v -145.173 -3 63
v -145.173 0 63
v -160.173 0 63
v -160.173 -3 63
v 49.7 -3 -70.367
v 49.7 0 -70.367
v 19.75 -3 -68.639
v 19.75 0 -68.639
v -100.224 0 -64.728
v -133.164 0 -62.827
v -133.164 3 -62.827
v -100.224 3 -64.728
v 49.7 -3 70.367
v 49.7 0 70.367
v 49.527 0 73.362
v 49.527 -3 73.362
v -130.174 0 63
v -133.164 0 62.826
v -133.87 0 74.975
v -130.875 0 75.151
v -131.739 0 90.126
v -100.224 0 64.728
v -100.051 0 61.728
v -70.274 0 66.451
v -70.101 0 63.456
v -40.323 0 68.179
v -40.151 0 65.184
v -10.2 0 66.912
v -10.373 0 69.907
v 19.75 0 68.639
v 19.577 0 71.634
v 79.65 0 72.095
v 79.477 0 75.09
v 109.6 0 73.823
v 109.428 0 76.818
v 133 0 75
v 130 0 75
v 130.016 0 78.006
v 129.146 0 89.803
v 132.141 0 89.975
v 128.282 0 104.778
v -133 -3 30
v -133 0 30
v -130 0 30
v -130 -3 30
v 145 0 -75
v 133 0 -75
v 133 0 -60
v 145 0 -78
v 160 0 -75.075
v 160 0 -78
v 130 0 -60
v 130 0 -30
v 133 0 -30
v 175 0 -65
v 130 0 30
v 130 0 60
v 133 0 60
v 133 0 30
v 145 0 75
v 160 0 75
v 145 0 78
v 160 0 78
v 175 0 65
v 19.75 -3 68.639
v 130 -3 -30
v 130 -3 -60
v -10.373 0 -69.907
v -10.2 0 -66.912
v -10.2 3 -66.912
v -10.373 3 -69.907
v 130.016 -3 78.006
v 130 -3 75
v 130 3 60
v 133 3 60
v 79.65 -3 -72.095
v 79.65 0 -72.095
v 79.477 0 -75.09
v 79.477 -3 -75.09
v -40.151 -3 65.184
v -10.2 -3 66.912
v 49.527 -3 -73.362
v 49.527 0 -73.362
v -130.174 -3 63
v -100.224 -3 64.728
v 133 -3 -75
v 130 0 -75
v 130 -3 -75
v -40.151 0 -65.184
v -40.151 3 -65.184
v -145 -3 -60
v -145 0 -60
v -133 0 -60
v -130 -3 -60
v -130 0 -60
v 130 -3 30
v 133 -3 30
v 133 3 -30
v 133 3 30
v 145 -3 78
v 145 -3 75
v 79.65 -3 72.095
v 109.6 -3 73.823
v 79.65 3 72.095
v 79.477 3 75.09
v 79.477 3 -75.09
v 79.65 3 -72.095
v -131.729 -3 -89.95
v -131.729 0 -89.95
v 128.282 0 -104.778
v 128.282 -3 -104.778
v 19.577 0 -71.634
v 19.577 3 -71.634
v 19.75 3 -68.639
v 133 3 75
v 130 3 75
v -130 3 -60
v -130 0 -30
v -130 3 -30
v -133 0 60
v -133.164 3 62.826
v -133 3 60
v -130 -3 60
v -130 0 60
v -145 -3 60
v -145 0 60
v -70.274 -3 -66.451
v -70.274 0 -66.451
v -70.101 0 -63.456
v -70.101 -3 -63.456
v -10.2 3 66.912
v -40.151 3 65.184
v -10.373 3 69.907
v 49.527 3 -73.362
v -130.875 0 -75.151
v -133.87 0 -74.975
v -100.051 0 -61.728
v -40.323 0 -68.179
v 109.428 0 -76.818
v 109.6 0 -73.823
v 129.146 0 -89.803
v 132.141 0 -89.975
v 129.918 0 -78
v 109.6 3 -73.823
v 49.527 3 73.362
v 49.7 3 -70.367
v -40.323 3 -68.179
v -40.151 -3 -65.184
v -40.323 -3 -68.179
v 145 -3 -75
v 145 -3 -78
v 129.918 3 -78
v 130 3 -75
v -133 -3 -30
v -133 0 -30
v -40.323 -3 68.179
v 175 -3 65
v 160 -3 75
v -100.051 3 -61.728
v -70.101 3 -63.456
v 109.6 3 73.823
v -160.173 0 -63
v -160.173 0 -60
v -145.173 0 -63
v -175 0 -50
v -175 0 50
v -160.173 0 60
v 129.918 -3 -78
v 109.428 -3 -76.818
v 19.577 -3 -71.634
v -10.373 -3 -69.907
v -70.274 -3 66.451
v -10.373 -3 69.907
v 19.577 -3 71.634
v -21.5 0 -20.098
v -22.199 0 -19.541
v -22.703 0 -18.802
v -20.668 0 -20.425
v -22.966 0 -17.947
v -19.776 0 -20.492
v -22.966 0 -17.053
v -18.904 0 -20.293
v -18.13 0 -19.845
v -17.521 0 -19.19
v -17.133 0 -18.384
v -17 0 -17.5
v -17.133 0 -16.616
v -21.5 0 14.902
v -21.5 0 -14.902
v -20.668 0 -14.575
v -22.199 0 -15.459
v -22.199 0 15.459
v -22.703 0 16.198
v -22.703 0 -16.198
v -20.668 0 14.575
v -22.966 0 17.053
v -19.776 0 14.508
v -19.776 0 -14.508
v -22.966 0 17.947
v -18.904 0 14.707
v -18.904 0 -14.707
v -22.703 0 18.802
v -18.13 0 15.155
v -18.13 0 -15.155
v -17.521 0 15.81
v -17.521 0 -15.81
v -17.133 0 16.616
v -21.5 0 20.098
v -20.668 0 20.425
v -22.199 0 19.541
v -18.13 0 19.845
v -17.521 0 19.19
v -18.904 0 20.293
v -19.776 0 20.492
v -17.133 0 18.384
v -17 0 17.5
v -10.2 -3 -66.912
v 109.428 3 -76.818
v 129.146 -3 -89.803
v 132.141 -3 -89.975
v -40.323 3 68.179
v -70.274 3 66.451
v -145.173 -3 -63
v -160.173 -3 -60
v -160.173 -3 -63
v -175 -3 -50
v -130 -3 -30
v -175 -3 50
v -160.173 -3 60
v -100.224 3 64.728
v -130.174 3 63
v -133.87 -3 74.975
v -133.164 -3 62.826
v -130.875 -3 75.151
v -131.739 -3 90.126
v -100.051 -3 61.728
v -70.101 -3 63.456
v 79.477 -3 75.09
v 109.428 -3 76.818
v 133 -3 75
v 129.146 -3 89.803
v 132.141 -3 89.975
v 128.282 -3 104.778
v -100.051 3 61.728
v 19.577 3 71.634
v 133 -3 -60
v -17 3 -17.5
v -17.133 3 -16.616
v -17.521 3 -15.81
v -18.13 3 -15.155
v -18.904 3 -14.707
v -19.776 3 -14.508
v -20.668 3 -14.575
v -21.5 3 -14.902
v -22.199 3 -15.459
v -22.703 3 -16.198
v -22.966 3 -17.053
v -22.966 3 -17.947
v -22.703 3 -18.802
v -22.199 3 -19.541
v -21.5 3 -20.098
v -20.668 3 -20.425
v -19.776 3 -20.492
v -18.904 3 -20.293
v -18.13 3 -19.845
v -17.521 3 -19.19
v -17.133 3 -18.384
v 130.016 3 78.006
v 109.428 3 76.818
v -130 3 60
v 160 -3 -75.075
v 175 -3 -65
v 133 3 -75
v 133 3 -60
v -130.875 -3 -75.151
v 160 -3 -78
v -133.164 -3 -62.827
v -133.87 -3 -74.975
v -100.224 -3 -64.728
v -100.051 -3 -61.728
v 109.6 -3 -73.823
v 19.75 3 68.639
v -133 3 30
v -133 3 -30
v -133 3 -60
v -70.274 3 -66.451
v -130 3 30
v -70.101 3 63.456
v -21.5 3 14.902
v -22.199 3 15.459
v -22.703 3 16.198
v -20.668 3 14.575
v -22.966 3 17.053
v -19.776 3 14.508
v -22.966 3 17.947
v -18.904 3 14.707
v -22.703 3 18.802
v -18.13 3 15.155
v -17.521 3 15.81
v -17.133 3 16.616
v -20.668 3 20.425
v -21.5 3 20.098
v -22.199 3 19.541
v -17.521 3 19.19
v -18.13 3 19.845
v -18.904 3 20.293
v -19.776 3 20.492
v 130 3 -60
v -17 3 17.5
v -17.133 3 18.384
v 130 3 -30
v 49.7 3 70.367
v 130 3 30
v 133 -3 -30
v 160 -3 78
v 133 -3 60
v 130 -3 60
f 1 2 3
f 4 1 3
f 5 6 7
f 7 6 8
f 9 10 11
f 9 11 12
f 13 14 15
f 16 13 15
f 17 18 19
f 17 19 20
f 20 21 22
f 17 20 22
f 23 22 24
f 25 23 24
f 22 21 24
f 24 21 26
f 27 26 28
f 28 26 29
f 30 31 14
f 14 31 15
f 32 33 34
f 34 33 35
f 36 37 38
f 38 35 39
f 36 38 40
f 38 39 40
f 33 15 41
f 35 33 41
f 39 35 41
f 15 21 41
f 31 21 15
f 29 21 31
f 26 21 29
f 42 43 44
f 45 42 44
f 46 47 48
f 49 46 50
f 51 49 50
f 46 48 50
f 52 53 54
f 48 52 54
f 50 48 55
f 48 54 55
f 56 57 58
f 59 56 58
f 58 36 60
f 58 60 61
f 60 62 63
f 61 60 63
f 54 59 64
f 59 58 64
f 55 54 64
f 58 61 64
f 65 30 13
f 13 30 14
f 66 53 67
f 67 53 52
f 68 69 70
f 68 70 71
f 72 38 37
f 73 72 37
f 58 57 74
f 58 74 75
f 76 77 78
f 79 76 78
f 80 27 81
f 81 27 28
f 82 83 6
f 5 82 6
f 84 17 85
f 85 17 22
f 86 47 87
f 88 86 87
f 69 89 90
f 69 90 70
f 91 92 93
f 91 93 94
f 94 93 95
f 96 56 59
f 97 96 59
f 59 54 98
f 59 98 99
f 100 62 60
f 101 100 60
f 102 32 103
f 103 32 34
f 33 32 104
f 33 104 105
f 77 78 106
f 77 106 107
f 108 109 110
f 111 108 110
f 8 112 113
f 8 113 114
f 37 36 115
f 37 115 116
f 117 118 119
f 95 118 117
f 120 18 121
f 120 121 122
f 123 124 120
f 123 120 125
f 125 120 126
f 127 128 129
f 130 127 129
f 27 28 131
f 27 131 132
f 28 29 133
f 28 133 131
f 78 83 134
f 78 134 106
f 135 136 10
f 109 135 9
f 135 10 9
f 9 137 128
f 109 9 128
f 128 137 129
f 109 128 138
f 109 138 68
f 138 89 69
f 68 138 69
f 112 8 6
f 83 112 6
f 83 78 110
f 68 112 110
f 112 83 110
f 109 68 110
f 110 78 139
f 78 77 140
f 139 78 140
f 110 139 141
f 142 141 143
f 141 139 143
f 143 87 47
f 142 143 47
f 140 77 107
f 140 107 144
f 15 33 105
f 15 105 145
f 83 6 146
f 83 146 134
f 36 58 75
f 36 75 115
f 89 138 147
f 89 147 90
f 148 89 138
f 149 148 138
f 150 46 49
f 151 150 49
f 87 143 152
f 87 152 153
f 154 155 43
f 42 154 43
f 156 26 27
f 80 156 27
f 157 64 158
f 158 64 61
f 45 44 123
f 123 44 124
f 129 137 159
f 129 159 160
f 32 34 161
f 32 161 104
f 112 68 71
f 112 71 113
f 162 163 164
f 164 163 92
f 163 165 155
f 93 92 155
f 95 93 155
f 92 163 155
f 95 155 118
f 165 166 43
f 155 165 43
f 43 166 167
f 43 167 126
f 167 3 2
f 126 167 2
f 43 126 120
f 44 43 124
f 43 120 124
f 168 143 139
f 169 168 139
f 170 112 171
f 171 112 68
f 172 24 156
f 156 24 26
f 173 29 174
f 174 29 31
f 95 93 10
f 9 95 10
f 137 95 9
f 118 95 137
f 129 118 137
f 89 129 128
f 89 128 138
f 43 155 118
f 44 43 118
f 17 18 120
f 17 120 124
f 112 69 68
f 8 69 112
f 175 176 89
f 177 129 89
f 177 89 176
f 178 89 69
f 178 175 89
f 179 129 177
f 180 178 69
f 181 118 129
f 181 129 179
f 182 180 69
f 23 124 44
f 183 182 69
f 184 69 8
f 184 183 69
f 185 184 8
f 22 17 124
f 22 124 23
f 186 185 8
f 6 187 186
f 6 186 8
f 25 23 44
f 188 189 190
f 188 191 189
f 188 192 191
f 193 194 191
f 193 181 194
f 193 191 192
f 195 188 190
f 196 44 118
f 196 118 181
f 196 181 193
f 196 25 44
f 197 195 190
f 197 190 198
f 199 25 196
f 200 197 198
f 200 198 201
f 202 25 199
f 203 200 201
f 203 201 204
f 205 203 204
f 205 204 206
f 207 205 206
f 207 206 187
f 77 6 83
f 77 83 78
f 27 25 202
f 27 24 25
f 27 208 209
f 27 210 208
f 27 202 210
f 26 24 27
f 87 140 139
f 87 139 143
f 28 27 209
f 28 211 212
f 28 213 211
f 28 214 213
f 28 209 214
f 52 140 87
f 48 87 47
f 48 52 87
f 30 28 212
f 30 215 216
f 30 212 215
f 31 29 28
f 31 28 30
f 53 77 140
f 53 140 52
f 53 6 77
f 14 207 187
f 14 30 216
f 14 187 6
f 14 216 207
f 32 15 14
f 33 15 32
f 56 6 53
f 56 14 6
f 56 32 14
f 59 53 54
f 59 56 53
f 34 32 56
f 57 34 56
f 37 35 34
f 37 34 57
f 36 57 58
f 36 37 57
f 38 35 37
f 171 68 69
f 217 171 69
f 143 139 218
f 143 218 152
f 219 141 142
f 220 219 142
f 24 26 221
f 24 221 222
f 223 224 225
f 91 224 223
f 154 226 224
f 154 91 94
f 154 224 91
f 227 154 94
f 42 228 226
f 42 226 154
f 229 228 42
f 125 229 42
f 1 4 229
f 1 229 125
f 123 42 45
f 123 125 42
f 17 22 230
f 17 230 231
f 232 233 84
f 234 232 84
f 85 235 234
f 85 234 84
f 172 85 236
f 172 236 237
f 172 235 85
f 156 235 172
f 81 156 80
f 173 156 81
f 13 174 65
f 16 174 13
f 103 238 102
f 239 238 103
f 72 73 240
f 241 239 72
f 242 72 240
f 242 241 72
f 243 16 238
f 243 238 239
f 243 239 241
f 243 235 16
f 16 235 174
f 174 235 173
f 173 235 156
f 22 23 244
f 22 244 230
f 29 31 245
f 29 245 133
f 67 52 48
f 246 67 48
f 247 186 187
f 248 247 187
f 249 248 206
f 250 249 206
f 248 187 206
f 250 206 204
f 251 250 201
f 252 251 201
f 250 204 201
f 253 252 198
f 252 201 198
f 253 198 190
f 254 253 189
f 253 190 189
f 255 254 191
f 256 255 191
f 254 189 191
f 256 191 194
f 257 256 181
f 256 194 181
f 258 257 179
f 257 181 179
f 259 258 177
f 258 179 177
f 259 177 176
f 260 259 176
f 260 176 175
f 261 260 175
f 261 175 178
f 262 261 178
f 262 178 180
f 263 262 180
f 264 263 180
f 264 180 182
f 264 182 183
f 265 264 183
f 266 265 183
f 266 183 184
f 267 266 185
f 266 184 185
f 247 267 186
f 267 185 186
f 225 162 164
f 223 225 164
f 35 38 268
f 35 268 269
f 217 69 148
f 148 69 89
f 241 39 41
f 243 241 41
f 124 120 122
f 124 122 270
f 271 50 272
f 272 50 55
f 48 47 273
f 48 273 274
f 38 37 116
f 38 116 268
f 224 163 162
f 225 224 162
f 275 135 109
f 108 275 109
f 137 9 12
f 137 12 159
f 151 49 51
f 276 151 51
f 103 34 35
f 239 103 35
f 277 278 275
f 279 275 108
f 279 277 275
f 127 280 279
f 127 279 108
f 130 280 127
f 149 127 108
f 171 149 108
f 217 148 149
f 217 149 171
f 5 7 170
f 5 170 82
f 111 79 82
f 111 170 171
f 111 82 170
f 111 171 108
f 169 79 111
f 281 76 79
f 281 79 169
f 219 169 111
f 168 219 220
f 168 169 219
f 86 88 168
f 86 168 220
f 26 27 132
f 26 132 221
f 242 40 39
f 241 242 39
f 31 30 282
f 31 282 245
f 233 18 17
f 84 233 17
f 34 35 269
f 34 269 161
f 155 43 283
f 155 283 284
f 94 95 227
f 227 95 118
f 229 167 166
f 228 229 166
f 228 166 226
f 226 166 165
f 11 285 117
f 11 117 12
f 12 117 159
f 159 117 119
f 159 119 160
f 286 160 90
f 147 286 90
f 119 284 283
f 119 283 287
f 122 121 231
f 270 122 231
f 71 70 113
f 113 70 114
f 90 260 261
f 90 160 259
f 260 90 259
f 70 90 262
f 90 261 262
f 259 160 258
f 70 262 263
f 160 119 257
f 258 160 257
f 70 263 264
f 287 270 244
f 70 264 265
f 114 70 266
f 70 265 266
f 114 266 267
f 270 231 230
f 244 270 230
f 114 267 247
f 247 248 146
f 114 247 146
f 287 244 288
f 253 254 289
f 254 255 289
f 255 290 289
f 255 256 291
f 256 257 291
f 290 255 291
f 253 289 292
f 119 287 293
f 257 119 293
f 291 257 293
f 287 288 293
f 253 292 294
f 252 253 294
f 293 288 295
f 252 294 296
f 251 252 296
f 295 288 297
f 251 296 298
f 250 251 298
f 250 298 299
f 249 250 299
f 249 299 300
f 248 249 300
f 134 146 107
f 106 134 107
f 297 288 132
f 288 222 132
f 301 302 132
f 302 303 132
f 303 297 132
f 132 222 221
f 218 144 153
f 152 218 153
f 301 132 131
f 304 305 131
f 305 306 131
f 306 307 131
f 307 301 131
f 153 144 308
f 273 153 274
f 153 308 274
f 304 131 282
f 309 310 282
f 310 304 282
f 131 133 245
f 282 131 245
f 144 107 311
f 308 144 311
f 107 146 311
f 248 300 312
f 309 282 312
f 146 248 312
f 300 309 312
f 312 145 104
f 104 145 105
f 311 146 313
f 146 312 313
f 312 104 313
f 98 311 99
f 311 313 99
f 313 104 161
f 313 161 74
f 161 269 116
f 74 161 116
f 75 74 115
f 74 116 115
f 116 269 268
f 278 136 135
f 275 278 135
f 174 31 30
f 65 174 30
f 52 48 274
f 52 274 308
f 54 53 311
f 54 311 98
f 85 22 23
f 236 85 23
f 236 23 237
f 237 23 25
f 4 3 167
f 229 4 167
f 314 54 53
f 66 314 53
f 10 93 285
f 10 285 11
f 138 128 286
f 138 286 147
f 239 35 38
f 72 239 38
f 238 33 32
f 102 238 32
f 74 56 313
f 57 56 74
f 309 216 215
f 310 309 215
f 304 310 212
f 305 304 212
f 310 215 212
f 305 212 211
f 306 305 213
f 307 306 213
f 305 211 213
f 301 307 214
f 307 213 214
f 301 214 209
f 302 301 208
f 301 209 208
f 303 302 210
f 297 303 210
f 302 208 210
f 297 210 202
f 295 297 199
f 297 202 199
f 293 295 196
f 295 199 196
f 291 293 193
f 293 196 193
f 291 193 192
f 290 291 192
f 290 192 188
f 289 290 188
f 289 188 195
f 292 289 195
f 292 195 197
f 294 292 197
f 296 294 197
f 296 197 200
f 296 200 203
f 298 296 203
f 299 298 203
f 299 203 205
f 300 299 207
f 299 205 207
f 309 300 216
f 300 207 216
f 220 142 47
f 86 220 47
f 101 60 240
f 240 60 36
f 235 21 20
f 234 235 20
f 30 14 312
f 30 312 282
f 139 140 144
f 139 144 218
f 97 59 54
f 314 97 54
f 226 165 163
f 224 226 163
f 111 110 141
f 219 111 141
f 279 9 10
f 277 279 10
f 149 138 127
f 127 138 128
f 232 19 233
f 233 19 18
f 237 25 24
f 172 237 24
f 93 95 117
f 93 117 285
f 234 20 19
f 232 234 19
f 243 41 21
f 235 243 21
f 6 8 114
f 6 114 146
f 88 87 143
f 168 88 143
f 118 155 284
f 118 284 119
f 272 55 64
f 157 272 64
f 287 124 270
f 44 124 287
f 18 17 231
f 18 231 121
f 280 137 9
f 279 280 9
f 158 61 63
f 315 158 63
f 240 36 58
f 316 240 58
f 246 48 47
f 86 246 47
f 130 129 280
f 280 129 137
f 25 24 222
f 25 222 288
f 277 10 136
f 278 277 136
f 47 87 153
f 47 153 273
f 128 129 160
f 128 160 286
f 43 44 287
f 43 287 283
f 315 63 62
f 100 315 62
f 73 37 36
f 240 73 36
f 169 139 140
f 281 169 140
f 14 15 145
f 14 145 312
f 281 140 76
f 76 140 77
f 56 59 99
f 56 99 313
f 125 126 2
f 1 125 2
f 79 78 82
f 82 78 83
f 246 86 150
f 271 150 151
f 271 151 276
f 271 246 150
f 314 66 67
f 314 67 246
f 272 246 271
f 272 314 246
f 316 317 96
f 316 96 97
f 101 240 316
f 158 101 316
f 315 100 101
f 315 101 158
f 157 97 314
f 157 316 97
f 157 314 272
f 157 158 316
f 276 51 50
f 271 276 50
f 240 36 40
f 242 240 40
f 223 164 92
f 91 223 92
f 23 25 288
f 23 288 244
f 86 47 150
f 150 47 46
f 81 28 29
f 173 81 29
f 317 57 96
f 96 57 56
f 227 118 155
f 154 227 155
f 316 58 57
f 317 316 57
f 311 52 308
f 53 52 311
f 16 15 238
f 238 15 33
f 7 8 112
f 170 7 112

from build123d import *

# Parameters (mm, degrees)
F0_R     = 3
F1_DEPTH = 3
F2_DEPTH = 3
F3_DEPTH = 3
F4_DEPTH = 3
F5_DEPTH = 3


with BuildPart() as f1:
    # F0 (on Front) → F1 (new body)
    with BuildSketch(Plane.XZ):
        Polygon((-100.051005, 61.727827), (-100.224086, 64.727896), (-130.174284, 63), (-133.164225, 62.8263), (-133, 60), (-130, 60), (-130, 30), (-133, 30), (-133, 0), (-133, -30), (-130, -30), (-130, -60), (-133, -60), (-133.164295, -62.827499), (-100.224086, -64.727896), (-100.051005, -61.727827), (-70.100807, -63.455723), (-70.273596, -66.450743), (-40.323398, -68.178639), (-40.150609, -65.183619), (-10.20041, -66.911515), (-10.3732, -69.906535), (19.576998, -71.634431), (19.749788, -68.639411), (49.699986, -70.367307), (49.527197, -73.362327), (79.477395, -75.090223), (79.650184, -72.095203), (109.600383, -73.823099), (109.427593, -76.818119), (129.918192, -78.000269), (130, -75), (133, -75), (133, -60), (130, -60), (130, -30), (133, -30), (133, 0), (133, 30), (130, 30), (130, 60), (133, 60), (133, 75), (130, 75), (130.015937, 78.005908), (109.427593, 76.818119), (109.600383, 73.823099), (79.650184, 72.095203), (79.477395, 75.090223), (49.527197, 73.362327), (49.699986, 70.367307), (19.749788, 68.639411), (19.576998, 71.634431), (-10.3732, 69.906535), (-10.20041, 66.911515), (-40.150609, 65.183619), (-40.323398, 68.178639), (-70.273596, 66.450743), (-70.100807, 63.455723), align=None)
        with Locations((-20, -17.5)):
            Circle(F0_R, mode=Mode.SUBTRACT)
        with Locations((-20, 17.5)):
            Circle(F0_R, mode=Mode.SUBTRACT)
    extrude(amount=-F1_DEPTH)

    # F0 (on Front) → F2 (join)
    with BuildSketch(Plane.XZ):
        Polygon((-130.174284, 63), (-100.224086, 64.727896), (-100.051005, 61.727827), (-70.100807, 63.455723), (-70.273596, 66.450743), (-40.323398, 68.178639), (-40.150609, 65.183619), (-10.20041, 66.911515), (-10.3732, 69.906535), (19.576998, 71.634431), (19.749788, 68.639411), (49.699986, 70.367307), (49.527197, 73.362327), (79.477395, 75.090223), (79.650184, 72.095203), (109.600383, 73.823099), (109.427593, 76.818119), (130.015937, 78.005908), (130, 75), (133, 75), (132.140548, 89.975358), (129.145528, 89.802568), (128.28158, 104.777667), (-131.739237, 90.125849), (-130.875289, 75.15075), (-133.870123, 74.974742), (-133.164225, 62.8263), align=None)
    extrude(amount=F2_DEPTH)

    # F0 (on Front) → F3 (join)
    with BuildSketch(Plane.XZ):
        Polygon((-130, 60), (-133, 60), (-145, 60), (-145.173077, 63), (-160.173077, 63), (-160.173077, 60), (-175, 50), (-175, 0), (-175, -50), (-160.173077, -60), (-160.173077, -63), (-145.173077, -63), (-145, -60), (-133, -60), (-130, -60), (-130, -30), (-133, -30), (-133, 0), (-133, 30), (-130, 30), align=None)
    extrude(amount=F3_DEPTH)

    # F0 (on Front) → F4 (join)
    with BuildSketch(Plane.XZ):
        Polygon((-100.224086, -64.727896), (-133.164295, -62.827499), (-133.870123, -74.974742), (-130.875289, -75.15075), (-131.729099, -89.950129), (128.28158, -104.777667), (129.145528, -89.802568), (132.140548, -89.975358), (133, -75), (130, -75), (129.918192, -78.000269), (109.427593, -76.818119), (109.600383, -73.823099), (79.650184, -72.095203), (79.477395, -75.090223), (49.527197, -73.362327), (49.699986, -70.367307), (19.749788, -68.639411), (19.576998, -71.634431), (-10.3732, -69.906535), (-10.20041, -66.911515), (-40.150609, -65.183619), (-40.323398, -68.178639), (-70.273596, -66.450743), (-70.100807, -63.455723), (-100.051005, -61.727827), align=None)
    extrude(amount=F4_DEPTH)

    # F0 (on Front) → F5 (join)
    with BuildSketch(Plane.XZ):
        Polygon((145, 75), (133, 75), (133, 60), (130, 60), (130, 30), (133, 30), (133, 0), (133, -30), (130, -30), (130, -60), (133, -60), (133, -75), (145, -75), (145, -78), (160, -78), (160, -75.074691), (175, -65), (175, 0), (175, 65), (160, 75), (160, 78), (145, 78), align=None)
    extrude(amount=F5_DEPTH)


solid = f1.part
